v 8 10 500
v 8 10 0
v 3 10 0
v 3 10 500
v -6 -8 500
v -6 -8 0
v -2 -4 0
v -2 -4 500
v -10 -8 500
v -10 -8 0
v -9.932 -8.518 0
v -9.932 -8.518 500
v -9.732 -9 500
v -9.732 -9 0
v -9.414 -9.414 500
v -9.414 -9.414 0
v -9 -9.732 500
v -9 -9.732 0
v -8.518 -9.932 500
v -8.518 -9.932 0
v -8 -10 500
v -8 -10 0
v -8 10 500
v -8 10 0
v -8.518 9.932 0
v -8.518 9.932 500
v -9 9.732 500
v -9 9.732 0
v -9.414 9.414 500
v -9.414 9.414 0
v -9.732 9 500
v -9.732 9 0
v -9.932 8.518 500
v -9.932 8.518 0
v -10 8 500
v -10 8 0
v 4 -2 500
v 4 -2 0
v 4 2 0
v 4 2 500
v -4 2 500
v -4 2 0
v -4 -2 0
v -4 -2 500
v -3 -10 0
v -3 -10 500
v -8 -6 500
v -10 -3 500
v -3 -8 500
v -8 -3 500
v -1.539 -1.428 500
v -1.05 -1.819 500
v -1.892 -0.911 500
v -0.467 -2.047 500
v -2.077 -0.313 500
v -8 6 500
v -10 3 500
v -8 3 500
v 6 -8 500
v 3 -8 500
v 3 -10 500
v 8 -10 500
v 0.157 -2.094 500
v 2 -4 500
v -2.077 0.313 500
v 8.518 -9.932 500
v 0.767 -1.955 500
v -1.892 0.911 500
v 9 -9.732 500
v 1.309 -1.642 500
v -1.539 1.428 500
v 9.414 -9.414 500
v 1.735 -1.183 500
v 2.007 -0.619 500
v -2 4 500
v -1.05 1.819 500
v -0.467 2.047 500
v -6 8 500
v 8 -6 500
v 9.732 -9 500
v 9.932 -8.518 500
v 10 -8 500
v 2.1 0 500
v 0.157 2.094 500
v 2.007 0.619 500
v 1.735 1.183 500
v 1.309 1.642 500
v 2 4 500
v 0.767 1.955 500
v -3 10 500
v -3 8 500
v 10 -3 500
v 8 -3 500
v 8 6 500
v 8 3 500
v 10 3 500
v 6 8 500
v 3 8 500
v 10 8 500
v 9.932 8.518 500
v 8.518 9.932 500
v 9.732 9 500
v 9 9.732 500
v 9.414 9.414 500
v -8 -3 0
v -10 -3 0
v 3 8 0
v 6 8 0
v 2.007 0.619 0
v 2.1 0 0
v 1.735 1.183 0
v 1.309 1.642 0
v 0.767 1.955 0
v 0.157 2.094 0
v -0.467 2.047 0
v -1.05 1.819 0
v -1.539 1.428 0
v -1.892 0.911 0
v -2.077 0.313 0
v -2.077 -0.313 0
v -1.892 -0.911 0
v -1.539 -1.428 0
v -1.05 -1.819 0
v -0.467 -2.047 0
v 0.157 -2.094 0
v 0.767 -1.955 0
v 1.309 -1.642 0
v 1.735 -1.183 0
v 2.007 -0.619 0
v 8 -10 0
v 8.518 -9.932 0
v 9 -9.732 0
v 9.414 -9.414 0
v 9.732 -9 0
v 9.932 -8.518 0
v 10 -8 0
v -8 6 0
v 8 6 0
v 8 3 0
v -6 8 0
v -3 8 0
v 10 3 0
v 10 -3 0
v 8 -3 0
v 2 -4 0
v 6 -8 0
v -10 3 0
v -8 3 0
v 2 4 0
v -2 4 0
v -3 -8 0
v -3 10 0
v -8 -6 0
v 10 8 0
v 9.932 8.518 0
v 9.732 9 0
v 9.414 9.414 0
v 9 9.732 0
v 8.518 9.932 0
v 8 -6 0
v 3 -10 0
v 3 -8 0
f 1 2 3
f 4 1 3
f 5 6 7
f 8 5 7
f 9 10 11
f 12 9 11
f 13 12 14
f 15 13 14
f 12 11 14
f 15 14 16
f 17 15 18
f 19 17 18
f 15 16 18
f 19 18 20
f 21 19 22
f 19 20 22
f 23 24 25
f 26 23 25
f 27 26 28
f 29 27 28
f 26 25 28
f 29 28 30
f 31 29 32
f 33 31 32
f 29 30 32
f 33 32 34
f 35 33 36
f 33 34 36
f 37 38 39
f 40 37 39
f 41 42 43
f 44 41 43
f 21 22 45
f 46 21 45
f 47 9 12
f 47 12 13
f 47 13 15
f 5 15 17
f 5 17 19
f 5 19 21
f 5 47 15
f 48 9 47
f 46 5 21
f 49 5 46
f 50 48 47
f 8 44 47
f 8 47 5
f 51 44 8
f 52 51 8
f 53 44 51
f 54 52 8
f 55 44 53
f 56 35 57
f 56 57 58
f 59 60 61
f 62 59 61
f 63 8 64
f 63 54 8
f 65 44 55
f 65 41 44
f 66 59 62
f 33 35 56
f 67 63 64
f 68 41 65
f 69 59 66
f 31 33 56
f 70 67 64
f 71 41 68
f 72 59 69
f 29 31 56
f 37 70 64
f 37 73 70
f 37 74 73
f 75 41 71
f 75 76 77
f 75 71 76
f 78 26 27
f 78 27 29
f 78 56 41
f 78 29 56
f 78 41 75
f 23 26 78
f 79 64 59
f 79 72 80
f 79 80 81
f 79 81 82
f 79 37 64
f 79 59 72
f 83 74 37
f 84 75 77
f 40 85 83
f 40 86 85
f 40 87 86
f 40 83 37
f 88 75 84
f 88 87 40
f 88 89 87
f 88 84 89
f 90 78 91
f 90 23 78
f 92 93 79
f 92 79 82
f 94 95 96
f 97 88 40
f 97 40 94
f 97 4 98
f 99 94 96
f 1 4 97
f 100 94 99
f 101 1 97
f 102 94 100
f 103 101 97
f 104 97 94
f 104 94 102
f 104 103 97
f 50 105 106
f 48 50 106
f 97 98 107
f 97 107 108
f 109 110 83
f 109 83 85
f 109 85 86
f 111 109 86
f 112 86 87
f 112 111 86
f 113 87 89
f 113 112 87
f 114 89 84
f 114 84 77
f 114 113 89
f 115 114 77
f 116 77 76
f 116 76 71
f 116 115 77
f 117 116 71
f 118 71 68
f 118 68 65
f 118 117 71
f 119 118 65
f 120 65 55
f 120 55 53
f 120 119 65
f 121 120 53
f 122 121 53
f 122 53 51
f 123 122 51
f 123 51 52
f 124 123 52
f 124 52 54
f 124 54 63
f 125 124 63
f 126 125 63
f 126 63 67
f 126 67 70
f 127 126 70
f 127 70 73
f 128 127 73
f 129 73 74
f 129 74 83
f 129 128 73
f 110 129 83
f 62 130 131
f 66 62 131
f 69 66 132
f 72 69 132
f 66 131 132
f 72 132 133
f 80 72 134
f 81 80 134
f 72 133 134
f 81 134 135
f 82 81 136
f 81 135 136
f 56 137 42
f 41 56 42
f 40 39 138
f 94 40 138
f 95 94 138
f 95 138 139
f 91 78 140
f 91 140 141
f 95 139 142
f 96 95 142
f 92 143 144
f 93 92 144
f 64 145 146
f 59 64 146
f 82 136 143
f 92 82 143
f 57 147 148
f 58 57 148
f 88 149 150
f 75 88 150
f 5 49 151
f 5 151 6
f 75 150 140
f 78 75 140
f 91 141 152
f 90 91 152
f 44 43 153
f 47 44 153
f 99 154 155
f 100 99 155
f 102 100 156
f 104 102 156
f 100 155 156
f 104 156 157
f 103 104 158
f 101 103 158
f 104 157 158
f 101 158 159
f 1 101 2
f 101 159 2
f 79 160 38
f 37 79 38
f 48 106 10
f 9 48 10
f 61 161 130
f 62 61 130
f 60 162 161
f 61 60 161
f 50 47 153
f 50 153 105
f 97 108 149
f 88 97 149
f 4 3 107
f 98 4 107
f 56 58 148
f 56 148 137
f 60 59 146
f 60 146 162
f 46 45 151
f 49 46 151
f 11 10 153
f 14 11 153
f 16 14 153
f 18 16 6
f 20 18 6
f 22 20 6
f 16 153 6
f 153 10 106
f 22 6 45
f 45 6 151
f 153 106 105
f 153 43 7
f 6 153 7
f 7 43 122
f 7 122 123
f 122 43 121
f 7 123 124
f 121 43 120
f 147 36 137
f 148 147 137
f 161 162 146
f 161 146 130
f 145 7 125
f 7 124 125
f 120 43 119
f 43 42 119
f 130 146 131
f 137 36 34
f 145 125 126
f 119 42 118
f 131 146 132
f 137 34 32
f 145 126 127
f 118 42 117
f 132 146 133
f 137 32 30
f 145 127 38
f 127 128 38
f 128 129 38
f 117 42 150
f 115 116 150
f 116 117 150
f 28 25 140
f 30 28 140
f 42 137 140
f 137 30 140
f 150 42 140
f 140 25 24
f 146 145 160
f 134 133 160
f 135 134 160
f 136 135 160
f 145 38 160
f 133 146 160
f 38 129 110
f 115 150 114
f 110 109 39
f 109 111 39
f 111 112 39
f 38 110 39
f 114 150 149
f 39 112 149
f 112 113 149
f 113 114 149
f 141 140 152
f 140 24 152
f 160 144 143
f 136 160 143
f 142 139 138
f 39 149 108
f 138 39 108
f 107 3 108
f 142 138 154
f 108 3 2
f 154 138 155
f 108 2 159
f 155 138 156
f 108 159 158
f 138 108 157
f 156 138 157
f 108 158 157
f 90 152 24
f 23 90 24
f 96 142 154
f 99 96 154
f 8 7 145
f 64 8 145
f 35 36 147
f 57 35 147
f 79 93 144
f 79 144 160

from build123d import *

# Parameters (mm, degrees)
SKETCH1_R           = 2.1
BOSS_EXTRUDE1_DEPTH = 500


with BuildPart() as part:
    # Sketch1 → Boss-Extrude1 (new body)
    with BuildSketch(Plane.XY):
        with BuildLine():
            Line((-2, -4), (2, -4))
            Line((2, -4), (6, -8))
            Line((6, -8), (3, -8))
            Line((3, -8), (3, -10))
            Line((3, -10), (8, -10))
            ThreePointArc((8, -10), (9.414213562, -9.414213562), (10, -8))
            Line((10, -8), (10, -3))
            Line((10, -3), (8, -3))
            Line((8, -3), (8, -6))
            Line((8, -6), (4, -2))
            Line((4, -2), (4, 2))
            Line((4, 2), (8, 6))
            Line((8, 6), (8, 3))
            Line((8, 3), (10, 3))
            Line((10, 3), (10, 8))
            ThreePointArc((10, 8), (9.414213562, 9.414213562), (8, 10))
            Line((8, 10), (3, 10))
            Line((3, 10), (3, 8))
            Line((3, 8), (6, 8))
            Line((6, 8), (2, 4))
            Line((2, 4), (-2, 4))
            Line((-2, 4), (-6, 8))
            Line((-6, 8), (-3, 8))
            Line((-3, 8), (-3, 10))
            Line((-3, 10), (-8, 10))
            ThreePointArc((-8, 10), (-9.414213562, 9.414213562), (-10, 8))
            Line((-10, 8), (-10, 3))
            Line((-10, 3), (-8, 3))
            Line((-8, 3), (-8, 6))
            Line((-8, 6), (-4, 2))
            Line((-4, 2), (-4, -2))
            Line((-4, -2), (-8, -6))
            Line((-8, -6), (-8, -3))
            Line((-8, -3), (-10, -3))
            Line((-10, -3), (-10, -8))
            ThreePointArc((-10, -8), (-9.414213562, -9.414213562), (-8, -10))
            Line((-8, -10), (-3, -10))
            Line((-3, -10), (-3, -8))
            Line((-3, -8), (-6, -8))
            Line((-6, -8), (-2, -4))
        make_face()
        Circle(SKETCH1_R, mode=Mode.SUBTRACT)
    extrude(amount=BOSS_EXTRUDE1_DEPTH)


solid = part.part
